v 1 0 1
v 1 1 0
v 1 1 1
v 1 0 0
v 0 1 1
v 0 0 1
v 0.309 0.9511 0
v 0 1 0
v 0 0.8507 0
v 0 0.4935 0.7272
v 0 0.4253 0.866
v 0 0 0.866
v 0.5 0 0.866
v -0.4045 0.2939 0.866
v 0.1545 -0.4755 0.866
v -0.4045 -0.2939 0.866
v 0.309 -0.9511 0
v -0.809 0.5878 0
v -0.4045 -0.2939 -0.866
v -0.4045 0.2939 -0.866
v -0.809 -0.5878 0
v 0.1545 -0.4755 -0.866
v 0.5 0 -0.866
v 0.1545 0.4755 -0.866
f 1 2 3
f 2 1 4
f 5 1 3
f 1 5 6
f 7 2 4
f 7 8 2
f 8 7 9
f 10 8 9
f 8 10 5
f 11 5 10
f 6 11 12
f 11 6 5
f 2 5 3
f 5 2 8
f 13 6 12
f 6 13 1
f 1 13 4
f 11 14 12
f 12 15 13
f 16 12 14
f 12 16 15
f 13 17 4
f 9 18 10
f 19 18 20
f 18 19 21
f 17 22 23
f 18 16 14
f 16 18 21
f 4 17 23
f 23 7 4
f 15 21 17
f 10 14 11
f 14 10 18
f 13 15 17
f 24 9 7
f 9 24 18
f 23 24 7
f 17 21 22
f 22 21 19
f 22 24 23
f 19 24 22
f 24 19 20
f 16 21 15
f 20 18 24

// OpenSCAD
if (true) cube(); else sphere();
if (false) cube(); else sphere();
if (false) cube();
translate([1, 0, 0]) if (false) cube();
union() { if (false) cube(); sphere(); }
if (true) { { cube(); } }
module m() { if (false) cube(); }
m();
